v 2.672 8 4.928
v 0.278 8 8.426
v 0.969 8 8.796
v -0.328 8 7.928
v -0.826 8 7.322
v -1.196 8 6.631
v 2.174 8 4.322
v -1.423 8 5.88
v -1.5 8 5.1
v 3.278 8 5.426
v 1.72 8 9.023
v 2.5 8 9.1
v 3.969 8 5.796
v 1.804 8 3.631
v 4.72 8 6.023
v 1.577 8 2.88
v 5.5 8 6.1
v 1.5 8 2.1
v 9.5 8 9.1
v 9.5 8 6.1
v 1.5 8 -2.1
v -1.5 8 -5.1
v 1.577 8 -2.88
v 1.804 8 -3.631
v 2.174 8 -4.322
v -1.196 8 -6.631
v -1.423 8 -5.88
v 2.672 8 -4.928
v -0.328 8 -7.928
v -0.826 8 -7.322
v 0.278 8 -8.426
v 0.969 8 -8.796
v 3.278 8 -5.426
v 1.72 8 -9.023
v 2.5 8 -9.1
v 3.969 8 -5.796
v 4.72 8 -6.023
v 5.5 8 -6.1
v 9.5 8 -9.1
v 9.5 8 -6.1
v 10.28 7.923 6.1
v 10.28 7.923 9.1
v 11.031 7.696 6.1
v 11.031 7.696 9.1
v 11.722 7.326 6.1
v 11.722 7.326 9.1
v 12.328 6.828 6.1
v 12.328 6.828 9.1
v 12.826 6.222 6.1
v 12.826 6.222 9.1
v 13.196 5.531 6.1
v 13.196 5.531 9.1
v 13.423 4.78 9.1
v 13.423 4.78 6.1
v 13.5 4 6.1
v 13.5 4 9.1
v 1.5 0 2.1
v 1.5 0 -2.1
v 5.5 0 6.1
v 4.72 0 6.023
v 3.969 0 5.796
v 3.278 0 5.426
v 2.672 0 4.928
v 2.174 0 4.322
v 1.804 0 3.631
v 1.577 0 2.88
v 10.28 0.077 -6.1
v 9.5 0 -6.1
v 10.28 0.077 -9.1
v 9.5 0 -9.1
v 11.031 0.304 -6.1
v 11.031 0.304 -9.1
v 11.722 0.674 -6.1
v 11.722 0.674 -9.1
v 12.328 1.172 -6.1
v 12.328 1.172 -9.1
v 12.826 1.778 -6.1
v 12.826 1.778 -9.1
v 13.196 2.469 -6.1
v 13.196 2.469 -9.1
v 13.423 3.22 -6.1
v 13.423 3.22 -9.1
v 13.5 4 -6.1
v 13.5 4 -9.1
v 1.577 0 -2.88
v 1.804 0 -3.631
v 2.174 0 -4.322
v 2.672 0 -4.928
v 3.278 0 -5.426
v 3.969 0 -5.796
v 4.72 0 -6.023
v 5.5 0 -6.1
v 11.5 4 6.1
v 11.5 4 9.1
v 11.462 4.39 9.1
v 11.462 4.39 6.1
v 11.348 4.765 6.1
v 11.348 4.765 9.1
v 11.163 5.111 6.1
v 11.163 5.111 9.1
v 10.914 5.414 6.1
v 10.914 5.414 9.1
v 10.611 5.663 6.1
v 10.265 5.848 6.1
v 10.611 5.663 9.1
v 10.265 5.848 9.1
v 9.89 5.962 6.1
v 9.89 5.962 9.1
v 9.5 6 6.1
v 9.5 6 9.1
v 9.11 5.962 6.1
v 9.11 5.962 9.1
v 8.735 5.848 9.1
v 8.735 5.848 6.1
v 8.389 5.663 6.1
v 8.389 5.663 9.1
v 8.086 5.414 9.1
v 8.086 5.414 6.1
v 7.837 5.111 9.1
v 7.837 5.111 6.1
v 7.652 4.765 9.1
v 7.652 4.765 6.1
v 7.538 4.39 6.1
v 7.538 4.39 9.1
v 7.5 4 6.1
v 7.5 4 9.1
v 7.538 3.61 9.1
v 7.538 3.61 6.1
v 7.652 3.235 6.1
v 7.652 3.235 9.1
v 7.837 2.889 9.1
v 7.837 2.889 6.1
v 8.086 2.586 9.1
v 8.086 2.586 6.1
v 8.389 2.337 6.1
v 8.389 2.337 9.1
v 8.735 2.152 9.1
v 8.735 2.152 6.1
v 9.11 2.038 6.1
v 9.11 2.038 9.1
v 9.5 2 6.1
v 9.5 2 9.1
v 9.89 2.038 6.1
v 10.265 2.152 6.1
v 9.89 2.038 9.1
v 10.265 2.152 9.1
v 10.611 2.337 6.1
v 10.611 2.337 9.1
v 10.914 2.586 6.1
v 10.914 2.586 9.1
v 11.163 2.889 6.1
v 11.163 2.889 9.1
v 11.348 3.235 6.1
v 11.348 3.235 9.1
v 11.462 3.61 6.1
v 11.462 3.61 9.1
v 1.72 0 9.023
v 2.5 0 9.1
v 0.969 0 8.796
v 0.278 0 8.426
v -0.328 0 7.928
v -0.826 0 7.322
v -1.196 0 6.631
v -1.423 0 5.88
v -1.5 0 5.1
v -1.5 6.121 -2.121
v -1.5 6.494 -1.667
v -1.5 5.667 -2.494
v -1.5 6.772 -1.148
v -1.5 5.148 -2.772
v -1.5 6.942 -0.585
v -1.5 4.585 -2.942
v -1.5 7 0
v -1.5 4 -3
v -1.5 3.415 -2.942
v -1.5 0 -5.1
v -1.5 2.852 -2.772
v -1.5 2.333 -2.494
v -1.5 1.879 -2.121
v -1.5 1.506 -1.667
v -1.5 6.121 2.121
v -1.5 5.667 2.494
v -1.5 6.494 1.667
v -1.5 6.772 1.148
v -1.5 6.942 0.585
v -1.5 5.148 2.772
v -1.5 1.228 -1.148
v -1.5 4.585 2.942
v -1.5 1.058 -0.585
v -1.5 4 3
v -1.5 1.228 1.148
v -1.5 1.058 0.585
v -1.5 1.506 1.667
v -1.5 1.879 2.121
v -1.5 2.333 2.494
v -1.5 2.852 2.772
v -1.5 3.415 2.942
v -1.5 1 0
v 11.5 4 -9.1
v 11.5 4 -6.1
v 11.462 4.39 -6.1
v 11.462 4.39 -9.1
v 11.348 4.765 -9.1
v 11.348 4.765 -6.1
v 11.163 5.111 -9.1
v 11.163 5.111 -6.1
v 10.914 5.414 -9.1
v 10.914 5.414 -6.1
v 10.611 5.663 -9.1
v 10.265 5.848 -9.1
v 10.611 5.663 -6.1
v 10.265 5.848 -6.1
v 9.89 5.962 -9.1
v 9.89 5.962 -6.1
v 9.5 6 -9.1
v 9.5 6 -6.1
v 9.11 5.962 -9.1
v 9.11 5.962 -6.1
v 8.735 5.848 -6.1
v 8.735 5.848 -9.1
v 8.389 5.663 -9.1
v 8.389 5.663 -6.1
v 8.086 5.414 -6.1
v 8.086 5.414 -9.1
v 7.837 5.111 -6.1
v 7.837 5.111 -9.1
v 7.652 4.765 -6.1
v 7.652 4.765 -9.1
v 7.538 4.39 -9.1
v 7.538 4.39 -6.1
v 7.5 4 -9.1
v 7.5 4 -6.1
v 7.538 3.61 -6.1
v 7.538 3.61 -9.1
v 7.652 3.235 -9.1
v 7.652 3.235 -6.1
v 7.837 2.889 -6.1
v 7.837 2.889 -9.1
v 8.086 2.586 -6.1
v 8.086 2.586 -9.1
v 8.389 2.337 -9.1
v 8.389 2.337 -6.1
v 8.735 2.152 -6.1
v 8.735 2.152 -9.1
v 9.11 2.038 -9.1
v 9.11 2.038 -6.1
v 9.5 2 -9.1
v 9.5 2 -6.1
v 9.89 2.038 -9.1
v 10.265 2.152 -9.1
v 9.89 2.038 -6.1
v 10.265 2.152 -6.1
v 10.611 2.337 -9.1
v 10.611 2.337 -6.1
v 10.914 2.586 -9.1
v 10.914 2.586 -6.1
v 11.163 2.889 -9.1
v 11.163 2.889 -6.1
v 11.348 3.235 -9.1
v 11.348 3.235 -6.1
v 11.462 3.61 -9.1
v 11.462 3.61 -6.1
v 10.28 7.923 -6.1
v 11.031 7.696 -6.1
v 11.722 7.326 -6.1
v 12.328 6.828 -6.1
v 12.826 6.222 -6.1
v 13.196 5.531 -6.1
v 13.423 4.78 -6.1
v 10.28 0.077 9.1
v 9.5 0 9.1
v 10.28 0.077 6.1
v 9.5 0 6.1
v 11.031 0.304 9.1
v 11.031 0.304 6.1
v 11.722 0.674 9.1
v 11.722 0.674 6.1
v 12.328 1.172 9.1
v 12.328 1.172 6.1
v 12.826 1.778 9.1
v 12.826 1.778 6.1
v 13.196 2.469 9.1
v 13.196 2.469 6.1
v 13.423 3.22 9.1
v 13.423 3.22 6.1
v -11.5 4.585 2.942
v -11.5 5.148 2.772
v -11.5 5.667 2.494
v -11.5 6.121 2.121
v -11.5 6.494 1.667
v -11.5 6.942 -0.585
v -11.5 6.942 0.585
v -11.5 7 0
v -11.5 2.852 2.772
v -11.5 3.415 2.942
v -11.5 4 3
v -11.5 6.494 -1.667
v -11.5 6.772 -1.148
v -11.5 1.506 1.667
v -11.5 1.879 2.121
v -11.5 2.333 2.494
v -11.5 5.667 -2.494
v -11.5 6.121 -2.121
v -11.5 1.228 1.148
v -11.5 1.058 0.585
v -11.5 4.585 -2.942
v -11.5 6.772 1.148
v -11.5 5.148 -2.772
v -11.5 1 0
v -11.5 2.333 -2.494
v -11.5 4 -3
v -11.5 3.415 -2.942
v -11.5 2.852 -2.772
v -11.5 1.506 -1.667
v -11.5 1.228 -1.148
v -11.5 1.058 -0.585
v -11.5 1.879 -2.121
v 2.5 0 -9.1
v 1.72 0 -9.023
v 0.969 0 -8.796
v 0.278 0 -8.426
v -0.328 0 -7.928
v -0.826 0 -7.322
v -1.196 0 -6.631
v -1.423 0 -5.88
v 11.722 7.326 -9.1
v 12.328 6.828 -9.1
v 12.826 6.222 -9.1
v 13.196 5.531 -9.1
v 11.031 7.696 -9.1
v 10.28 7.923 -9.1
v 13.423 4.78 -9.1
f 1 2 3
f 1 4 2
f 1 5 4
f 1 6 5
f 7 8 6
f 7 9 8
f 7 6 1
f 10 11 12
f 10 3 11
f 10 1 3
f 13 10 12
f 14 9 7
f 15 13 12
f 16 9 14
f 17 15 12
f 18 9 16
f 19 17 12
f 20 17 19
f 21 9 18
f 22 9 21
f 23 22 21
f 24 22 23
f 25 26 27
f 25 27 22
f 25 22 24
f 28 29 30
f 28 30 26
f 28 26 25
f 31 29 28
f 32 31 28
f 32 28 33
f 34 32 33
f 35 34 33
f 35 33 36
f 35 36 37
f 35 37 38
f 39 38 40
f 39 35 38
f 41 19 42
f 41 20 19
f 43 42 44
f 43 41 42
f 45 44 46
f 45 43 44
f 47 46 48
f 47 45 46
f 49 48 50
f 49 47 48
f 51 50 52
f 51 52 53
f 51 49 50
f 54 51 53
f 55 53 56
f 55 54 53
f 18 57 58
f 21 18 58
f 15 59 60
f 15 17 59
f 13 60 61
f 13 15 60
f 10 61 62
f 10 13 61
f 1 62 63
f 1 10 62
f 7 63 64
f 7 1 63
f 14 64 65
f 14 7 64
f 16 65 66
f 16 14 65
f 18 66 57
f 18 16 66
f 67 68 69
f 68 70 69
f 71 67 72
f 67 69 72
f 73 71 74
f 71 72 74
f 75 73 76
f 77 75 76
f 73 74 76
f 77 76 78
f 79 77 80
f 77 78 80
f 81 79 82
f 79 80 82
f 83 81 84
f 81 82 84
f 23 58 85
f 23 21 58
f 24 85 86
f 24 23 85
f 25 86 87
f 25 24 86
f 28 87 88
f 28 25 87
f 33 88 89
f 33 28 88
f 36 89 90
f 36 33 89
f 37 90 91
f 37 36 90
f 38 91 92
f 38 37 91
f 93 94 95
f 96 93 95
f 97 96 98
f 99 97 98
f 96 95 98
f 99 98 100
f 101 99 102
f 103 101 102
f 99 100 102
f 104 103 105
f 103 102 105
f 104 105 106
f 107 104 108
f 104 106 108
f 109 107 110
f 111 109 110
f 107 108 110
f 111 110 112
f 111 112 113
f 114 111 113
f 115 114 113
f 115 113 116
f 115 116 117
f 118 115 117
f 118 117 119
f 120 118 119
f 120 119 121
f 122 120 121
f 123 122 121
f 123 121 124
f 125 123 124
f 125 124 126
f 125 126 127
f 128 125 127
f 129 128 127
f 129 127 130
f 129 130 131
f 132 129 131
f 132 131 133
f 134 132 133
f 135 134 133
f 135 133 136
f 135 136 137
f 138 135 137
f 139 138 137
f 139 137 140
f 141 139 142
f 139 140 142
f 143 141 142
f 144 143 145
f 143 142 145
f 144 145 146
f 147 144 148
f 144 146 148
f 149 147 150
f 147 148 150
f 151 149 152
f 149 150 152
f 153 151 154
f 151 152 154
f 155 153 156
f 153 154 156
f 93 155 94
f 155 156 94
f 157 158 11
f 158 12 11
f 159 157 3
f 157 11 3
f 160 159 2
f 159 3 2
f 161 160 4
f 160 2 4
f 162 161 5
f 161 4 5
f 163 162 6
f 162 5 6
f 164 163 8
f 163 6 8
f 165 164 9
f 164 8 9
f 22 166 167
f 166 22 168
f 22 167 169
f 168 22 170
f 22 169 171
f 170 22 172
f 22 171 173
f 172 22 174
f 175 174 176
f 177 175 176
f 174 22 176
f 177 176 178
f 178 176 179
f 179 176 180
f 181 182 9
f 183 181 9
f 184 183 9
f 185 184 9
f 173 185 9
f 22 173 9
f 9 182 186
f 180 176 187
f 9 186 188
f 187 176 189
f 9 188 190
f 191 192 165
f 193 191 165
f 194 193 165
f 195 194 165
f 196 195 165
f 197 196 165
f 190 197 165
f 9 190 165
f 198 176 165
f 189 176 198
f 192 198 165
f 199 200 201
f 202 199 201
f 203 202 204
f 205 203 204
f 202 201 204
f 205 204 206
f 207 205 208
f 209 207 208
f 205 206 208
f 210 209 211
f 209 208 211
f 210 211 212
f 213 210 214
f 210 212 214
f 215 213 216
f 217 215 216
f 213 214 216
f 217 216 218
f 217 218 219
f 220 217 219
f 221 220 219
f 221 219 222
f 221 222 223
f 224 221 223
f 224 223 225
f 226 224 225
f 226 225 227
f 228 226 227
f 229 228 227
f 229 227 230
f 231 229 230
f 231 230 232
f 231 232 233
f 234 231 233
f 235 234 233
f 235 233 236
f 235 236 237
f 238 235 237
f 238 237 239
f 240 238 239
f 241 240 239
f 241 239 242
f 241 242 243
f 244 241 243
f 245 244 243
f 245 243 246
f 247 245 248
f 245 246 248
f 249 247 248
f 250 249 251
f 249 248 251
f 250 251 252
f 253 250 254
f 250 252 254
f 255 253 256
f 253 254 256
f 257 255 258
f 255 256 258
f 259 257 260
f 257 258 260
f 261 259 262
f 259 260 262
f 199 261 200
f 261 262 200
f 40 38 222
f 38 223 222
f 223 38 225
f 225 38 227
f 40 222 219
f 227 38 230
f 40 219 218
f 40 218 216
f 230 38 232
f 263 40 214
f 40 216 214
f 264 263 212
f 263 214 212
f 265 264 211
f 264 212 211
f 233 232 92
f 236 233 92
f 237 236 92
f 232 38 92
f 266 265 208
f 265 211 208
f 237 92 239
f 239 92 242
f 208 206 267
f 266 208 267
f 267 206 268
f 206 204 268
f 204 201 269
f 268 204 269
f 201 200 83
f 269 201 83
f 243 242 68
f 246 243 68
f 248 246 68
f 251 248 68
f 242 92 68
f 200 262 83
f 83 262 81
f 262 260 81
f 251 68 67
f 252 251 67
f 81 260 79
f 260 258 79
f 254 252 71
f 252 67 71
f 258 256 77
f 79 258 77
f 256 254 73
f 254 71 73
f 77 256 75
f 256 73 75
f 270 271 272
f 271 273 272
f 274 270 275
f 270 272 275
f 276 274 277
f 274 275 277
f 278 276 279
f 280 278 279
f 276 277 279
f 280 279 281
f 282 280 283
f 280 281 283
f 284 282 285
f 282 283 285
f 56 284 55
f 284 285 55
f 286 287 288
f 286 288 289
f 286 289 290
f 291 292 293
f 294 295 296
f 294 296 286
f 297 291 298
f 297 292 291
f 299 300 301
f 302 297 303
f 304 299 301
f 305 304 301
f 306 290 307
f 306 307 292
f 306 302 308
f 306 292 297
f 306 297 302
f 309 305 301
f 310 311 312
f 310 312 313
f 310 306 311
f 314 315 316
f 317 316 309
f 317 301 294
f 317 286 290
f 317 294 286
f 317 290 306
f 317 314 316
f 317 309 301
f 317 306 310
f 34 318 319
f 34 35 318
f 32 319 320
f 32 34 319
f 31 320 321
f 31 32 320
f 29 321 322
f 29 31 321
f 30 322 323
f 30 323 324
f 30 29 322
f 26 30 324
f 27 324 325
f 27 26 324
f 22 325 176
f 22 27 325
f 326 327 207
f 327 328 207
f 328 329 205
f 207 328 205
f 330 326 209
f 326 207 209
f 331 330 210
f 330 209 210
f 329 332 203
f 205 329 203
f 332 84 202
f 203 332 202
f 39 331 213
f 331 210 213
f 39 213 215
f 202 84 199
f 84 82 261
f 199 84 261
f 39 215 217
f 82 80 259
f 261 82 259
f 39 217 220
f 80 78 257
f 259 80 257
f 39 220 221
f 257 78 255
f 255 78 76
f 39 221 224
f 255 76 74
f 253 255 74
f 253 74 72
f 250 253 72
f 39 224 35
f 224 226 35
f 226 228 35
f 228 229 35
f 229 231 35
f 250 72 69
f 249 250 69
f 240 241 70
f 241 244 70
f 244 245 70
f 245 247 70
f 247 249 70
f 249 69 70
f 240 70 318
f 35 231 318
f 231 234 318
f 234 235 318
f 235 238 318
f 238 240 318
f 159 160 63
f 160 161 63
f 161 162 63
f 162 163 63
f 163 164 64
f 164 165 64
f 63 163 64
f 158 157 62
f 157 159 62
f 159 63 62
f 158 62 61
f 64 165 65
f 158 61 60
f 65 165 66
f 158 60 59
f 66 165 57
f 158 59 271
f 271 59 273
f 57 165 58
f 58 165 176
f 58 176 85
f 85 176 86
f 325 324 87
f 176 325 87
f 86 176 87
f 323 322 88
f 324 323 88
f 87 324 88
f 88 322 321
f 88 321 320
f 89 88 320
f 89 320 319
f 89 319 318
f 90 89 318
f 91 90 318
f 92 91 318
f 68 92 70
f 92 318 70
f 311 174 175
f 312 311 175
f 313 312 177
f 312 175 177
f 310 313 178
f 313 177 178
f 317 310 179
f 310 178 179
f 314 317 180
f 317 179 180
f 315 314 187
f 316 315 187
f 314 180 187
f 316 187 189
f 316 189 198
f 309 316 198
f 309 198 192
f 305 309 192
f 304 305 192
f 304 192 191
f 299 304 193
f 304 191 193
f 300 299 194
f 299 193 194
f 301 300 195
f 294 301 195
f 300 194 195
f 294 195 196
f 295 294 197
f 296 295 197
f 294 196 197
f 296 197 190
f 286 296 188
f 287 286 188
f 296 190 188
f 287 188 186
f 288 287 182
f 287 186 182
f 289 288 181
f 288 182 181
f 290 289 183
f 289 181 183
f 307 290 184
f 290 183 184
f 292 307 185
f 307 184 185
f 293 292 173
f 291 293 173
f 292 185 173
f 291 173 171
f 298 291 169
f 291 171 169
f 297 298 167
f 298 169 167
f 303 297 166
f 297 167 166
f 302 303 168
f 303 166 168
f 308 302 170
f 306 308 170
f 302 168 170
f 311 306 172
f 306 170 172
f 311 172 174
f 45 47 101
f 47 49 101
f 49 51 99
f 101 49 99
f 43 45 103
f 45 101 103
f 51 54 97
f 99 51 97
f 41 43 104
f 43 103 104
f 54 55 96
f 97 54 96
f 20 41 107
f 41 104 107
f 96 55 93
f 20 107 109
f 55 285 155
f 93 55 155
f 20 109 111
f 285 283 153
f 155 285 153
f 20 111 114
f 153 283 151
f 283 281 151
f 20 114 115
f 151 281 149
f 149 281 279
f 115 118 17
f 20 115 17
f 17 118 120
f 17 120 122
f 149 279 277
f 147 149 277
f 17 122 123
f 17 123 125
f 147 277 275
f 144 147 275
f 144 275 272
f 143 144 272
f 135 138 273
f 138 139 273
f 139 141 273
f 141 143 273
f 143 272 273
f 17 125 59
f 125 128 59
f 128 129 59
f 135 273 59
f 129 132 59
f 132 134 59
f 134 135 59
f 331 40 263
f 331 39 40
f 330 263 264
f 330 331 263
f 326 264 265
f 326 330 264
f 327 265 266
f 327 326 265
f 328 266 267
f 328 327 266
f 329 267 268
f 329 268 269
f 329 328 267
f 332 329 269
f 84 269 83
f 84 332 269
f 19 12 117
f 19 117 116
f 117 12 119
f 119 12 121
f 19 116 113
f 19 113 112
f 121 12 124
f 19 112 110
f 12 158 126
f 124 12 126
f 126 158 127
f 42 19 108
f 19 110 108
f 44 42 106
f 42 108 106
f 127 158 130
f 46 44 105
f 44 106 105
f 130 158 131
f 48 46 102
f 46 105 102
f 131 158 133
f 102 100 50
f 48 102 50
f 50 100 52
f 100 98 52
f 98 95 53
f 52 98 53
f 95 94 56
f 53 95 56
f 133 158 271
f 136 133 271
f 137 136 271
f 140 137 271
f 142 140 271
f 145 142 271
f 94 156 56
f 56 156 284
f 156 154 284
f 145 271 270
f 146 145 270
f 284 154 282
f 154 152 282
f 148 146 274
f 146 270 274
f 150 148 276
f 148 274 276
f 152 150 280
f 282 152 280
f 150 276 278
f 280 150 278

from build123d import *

# Parameters (mm, degrees)
BOSS_EXTRUDE1_DEPTH = 8
SKETCH2_R           = 2
CUT_EXTRUDE1_DEPTH  = 25.031021618
SKETCH3_R           = 3
BOSS_EXTRUDE2_DEPTH = 10
FILLET1_R           = 4
FILLET2_R           = 4


with BuildPart() as part:
    # Sketch1 → Boss-Extrude1 (new body)
    with BuildSketch(Plane(origin=(0, 0, 0), x_dir=(1, 0, 0), z_dir=(0, 1, 0))):
        Polygon((1.5, -6.1), (1.5, 6.1), (13.5, 6.1), (13.5, 9.1), (-1.5, 9.1), (-1.5, -9.1), (13.5, -9.1), (13.5, -6.1), align=None)
    extrude(amount=BOSS_EXTRUDE1_DEPTH)

    # Sketch2 → Cut-Extrude1 (cut, through all)
    with BuildSketch(Plane.XY.offset(9.1)):
        with Locations((9.5, 4)):
            Circle(SKETCH2_R)
    extrude(amount=-CUT_EXTRUDE1_DEPTH, mode=Mode.SUBTRACT)

    # Sketch3 → Boss-Extrude2 (add)
    with BuildSketch(Plane.ZY.offset(1.5)):
        with Locations(Location((0, 4, 0), (0, 0, 180))):
            Circle(SKETCH3_R)
    extrude(amount=BOSS_EXTRUDE2_DEPTH)

    # Fillet1
    fillet1_edges = [part.edges().sort_by_distance(p)[0] for p in [
        (13.5, 8, -7.6),
        (13.5, 0, -7.6),
        (13.5, 0, 7.6),
        (13.5, 8, 7.6),
    ]]
    fillet(fillet1_edges, radius=FILLET1_R - 0.0001)  # a hair under: the kernel refuses the full size

    # Fillet2
    fillet2_edges = [part.edges().sort_by_distance(p)[0] for p in [
        (1.5, 4, -6.1),
        (1.5, 4, 6.1),
        (-1.5, 4, 9.1),
        (-1.5, 4, -9.1),
    ]]
    fillet(fillet2_edges, radius=FILLET2_R)


solid = part.part
